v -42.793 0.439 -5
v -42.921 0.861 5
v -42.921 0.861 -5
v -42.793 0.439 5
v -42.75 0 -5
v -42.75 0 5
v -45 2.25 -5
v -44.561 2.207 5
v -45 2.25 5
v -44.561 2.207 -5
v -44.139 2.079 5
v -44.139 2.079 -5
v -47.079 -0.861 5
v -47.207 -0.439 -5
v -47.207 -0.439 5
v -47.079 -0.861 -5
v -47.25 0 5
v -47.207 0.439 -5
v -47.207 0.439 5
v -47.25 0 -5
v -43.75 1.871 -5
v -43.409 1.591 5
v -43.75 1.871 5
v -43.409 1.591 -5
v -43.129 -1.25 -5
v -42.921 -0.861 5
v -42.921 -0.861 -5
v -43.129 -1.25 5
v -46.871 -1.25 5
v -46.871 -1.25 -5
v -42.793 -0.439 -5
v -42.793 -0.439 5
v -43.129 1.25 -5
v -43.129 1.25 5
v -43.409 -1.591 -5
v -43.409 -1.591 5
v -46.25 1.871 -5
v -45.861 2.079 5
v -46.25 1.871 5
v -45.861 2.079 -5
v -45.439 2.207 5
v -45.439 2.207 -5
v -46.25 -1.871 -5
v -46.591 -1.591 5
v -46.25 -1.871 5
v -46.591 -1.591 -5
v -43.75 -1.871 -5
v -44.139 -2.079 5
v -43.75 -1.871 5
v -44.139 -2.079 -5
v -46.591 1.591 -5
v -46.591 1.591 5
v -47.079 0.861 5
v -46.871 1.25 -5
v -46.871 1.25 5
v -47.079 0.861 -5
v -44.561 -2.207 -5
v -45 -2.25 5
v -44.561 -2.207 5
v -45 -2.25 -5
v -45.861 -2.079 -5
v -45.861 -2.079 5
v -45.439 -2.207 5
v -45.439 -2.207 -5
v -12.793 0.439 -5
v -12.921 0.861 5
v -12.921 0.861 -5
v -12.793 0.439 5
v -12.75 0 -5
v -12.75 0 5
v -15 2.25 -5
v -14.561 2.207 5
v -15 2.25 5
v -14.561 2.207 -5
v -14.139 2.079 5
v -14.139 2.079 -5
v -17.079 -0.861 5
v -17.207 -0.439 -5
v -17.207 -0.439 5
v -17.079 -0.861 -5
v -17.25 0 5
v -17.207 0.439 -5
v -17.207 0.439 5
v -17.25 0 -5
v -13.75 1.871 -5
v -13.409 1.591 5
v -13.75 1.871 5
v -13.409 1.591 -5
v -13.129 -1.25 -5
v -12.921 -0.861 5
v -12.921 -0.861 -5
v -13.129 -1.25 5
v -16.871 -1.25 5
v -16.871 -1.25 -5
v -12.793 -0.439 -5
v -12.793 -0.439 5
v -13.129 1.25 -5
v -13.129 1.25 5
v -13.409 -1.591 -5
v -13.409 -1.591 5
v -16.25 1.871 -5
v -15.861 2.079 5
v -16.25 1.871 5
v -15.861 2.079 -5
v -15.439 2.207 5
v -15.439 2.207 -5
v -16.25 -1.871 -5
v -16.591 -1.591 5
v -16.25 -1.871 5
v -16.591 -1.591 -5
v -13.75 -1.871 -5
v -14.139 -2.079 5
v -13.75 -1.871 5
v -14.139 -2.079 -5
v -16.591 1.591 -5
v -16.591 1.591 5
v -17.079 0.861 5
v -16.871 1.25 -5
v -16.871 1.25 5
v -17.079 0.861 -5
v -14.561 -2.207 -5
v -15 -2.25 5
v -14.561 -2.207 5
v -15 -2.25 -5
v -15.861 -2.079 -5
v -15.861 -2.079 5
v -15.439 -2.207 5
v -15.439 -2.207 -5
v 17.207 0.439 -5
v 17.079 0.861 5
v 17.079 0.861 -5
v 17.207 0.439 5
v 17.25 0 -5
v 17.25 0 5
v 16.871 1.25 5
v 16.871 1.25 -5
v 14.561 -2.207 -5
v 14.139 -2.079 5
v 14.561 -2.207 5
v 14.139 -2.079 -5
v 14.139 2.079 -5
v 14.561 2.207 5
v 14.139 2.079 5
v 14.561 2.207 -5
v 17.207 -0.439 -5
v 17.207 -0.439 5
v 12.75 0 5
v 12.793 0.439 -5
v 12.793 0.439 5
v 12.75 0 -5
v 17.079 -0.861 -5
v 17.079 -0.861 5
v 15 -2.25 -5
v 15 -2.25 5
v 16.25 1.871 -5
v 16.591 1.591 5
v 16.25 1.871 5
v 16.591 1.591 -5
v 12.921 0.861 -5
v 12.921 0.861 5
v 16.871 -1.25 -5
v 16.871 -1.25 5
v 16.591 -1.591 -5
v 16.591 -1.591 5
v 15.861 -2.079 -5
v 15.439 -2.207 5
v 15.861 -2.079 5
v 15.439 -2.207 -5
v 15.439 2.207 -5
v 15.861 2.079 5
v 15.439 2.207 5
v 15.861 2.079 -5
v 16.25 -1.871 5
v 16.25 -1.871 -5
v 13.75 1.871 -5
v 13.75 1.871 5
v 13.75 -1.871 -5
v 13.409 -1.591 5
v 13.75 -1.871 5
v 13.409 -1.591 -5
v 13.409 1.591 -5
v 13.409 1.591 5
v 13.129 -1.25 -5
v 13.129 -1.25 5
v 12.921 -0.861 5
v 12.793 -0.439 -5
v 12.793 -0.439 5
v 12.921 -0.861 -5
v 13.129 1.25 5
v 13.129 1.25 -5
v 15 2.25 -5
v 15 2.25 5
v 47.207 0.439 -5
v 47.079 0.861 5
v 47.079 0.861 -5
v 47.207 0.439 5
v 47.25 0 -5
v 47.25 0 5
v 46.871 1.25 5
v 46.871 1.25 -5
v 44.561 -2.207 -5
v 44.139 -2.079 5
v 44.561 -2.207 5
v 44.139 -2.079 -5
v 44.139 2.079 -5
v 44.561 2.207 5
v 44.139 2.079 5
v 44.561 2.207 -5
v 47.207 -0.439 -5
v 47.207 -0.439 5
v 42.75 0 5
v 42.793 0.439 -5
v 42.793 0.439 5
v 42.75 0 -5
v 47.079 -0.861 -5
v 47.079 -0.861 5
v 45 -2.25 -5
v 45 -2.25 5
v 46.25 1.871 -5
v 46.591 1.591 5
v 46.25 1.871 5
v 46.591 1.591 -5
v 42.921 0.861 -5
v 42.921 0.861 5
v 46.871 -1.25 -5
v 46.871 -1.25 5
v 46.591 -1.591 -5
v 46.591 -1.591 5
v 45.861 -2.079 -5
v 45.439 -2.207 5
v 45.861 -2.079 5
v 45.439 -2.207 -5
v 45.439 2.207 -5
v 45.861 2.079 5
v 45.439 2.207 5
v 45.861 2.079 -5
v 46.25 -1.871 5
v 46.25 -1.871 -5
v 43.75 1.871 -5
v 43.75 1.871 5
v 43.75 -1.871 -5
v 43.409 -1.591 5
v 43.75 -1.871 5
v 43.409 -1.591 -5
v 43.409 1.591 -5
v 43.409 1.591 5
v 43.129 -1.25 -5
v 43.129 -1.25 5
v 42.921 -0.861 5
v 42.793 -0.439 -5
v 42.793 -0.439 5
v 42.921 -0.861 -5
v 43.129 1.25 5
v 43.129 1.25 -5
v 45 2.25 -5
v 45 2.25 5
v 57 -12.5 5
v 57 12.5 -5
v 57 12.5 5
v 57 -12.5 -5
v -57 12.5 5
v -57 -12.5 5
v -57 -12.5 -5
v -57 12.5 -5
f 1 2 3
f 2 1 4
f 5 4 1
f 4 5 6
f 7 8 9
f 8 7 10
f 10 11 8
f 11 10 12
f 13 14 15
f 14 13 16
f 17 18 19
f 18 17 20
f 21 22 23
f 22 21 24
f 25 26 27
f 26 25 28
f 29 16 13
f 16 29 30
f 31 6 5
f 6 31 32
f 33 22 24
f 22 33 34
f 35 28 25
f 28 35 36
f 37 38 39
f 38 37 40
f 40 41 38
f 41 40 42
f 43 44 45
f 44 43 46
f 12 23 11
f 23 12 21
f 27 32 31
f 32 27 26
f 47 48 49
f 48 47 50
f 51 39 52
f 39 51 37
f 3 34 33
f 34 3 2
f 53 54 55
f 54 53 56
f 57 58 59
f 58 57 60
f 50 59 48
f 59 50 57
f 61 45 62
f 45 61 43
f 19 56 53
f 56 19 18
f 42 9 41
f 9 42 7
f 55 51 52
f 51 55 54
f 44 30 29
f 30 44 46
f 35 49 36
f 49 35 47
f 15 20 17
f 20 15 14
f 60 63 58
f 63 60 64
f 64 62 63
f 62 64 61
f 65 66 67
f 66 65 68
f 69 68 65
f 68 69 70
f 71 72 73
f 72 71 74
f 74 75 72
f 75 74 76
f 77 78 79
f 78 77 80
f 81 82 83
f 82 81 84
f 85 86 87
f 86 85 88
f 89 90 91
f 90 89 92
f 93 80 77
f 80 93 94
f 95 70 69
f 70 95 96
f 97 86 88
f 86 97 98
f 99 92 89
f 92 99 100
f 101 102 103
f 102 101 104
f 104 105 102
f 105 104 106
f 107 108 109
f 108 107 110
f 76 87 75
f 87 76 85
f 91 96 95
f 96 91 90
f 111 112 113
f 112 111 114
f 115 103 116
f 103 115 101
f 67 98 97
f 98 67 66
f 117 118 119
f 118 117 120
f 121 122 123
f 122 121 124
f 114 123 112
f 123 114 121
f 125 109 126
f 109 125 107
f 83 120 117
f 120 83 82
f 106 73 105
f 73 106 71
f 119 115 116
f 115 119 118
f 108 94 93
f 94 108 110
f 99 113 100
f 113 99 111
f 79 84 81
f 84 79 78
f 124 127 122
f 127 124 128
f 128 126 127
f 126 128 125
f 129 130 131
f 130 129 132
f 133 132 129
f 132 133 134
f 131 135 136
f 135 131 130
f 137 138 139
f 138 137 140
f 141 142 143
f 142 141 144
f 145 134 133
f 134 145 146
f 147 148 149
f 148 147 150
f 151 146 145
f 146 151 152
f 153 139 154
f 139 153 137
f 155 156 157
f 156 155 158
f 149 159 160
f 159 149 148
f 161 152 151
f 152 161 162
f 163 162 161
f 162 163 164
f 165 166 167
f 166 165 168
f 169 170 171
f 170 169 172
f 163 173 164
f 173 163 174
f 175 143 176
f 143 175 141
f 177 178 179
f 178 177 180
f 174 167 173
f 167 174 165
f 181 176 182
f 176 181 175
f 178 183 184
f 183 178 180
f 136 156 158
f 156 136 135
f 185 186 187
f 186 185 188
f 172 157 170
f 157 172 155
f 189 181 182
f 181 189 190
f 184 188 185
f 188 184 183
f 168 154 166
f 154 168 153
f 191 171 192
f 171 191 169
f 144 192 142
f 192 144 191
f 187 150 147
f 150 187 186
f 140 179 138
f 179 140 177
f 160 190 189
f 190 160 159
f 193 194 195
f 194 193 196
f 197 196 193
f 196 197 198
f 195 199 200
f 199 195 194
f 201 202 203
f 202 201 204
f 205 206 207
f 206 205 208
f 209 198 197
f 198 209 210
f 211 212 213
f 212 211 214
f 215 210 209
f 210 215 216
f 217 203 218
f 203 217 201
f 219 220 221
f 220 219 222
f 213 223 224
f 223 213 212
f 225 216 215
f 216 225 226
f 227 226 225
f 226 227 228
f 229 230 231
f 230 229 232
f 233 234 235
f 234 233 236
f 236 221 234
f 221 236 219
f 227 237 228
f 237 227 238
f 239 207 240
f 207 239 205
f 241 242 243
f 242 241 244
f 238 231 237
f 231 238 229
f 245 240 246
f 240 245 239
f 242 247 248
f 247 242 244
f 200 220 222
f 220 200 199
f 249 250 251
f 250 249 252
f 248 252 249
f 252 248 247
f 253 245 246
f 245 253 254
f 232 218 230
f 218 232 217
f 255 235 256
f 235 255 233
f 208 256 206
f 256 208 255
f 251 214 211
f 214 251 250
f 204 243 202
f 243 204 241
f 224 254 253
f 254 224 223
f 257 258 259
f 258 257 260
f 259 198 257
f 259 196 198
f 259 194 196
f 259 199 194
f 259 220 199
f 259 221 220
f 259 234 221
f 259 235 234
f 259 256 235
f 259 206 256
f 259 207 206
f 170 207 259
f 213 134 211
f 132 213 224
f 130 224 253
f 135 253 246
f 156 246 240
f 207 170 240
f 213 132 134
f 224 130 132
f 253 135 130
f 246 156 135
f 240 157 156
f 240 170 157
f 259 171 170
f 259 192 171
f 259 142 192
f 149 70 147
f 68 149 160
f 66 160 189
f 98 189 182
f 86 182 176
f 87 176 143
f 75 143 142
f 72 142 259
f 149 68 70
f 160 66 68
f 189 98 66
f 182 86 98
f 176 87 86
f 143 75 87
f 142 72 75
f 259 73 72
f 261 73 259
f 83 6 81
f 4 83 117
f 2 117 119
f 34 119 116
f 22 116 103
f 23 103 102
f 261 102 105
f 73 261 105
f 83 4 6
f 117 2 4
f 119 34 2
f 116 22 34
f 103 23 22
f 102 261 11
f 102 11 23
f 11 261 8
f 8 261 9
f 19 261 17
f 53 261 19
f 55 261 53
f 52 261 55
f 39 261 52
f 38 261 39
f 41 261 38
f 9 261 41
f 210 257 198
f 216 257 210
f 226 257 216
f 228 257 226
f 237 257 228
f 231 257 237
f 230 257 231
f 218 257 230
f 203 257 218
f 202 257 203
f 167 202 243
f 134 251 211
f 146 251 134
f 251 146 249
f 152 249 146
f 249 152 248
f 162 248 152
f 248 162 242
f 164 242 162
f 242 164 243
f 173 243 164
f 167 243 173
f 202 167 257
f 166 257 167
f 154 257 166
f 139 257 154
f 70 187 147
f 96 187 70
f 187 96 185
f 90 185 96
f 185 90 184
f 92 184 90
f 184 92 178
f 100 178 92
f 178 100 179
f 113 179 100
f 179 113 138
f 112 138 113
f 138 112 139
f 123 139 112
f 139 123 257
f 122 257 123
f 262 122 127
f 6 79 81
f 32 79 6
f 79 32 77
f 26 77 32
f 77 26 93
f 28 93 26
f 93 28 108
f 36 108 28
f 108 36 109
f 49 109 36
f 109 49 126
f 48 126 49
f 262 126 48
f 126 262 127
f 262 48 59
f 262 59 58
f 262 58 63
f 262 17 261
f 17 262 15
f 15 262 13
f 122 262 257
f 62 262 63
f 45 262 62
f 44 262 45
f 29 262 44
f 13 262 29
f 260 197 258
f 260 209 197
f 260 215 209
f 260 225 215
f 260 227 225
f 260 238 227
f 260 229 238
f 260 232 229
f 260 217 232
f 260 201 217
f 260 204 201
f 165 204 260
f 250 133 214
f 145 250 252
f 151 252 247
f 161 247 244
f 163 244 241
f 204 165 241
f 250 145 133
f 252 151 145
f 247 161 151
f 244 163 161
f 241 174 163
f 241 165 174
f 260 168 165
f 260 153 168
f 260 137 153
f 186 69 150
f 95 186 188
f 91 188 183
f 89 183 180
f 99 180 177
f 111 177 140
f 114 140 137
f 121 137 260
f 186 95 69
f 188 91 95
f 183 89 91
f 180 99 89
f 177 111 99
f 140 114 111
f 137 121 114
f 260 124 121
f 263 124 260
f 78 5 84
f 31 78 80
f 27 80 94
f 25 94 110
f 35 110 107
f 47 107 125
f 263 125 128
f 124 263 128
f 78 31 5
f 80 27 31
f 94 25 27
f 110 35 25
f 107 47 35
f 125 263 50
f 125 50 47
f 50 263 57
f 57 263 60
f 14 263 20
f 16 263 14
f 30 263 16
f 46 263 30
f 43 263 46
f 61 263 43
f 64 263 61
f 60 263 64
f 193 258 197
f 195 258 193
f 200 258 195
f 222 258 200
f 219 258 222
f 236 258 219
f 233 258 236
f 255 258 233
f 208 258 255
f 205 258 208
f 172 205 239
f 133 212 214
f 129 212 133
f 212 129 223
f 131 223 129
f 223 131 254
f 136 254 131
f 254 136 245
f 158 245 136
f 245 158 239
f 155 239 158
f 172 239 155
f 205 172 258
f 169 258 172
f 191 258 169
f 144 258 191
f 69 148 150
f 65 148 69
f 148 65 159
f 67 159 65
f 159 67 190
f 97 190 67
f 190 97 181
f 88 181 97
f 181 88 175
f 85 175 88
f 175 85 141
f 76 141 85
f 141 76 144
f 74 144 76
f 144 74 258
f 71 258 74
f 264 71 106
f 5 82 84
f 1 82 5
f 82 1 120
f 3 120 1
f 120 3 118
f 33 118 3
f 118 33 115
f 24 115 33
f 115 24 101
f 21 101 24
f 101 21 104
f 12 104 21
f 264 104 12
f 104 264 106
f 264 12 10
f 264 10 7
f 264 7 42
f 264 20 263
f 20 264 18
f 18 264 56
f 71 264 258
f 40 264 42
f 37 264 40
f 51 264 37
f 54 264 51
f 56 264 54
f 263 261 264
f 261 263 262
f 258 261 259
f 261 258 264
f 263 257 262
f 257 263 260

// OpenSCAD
$fn = 32;

// ----------------------------------------------------------------------
// Hole bar, 4 x Ø4.5
// row layout, 12 mm edge offset
// ----------------------------------------------------------------------

// --- parameters (mm) ---
bar_w = 25;    // bar width (Y)
bar_t = 10;    // bar thickness (Z)
holes = 4;     // holes per row
hole_d = 4.5;  // hole diameter
edge = 12;     // offset from the bar end to the first hole
pitch = 30;    // pitch between neighbouring holes

// --- derived feature positions (mm) ---
span = (holes - 1) * pitch;   // = 90   distance between the end holes
bar_l = span + 2 * edge;      // = 114   overall bar length
start_x = -bar_l / 2 + edge;  // = -45   X of the first hole
feature_centers = [
  [start_x + 0 * pitch, 0],
  [start_x + 1 * pitch, 0],
  [start_x + 2 * pitch, 0],
  [start_x + 3 * pitch, 0]
];   // hole centres of the first row

// bar with one row of holes, drilled from feature_centers
difference() {
  translate([-bar_l / 2, -bar_w / 2, -bar_t / 2]) cube([bar_l, bar_w, bar_t]);
  for (centre = feature_centers)
    translate([centre[0], centre[1], 0])
      cylinder(d = hole_d, h = bar_t + 2, center = true);
}
